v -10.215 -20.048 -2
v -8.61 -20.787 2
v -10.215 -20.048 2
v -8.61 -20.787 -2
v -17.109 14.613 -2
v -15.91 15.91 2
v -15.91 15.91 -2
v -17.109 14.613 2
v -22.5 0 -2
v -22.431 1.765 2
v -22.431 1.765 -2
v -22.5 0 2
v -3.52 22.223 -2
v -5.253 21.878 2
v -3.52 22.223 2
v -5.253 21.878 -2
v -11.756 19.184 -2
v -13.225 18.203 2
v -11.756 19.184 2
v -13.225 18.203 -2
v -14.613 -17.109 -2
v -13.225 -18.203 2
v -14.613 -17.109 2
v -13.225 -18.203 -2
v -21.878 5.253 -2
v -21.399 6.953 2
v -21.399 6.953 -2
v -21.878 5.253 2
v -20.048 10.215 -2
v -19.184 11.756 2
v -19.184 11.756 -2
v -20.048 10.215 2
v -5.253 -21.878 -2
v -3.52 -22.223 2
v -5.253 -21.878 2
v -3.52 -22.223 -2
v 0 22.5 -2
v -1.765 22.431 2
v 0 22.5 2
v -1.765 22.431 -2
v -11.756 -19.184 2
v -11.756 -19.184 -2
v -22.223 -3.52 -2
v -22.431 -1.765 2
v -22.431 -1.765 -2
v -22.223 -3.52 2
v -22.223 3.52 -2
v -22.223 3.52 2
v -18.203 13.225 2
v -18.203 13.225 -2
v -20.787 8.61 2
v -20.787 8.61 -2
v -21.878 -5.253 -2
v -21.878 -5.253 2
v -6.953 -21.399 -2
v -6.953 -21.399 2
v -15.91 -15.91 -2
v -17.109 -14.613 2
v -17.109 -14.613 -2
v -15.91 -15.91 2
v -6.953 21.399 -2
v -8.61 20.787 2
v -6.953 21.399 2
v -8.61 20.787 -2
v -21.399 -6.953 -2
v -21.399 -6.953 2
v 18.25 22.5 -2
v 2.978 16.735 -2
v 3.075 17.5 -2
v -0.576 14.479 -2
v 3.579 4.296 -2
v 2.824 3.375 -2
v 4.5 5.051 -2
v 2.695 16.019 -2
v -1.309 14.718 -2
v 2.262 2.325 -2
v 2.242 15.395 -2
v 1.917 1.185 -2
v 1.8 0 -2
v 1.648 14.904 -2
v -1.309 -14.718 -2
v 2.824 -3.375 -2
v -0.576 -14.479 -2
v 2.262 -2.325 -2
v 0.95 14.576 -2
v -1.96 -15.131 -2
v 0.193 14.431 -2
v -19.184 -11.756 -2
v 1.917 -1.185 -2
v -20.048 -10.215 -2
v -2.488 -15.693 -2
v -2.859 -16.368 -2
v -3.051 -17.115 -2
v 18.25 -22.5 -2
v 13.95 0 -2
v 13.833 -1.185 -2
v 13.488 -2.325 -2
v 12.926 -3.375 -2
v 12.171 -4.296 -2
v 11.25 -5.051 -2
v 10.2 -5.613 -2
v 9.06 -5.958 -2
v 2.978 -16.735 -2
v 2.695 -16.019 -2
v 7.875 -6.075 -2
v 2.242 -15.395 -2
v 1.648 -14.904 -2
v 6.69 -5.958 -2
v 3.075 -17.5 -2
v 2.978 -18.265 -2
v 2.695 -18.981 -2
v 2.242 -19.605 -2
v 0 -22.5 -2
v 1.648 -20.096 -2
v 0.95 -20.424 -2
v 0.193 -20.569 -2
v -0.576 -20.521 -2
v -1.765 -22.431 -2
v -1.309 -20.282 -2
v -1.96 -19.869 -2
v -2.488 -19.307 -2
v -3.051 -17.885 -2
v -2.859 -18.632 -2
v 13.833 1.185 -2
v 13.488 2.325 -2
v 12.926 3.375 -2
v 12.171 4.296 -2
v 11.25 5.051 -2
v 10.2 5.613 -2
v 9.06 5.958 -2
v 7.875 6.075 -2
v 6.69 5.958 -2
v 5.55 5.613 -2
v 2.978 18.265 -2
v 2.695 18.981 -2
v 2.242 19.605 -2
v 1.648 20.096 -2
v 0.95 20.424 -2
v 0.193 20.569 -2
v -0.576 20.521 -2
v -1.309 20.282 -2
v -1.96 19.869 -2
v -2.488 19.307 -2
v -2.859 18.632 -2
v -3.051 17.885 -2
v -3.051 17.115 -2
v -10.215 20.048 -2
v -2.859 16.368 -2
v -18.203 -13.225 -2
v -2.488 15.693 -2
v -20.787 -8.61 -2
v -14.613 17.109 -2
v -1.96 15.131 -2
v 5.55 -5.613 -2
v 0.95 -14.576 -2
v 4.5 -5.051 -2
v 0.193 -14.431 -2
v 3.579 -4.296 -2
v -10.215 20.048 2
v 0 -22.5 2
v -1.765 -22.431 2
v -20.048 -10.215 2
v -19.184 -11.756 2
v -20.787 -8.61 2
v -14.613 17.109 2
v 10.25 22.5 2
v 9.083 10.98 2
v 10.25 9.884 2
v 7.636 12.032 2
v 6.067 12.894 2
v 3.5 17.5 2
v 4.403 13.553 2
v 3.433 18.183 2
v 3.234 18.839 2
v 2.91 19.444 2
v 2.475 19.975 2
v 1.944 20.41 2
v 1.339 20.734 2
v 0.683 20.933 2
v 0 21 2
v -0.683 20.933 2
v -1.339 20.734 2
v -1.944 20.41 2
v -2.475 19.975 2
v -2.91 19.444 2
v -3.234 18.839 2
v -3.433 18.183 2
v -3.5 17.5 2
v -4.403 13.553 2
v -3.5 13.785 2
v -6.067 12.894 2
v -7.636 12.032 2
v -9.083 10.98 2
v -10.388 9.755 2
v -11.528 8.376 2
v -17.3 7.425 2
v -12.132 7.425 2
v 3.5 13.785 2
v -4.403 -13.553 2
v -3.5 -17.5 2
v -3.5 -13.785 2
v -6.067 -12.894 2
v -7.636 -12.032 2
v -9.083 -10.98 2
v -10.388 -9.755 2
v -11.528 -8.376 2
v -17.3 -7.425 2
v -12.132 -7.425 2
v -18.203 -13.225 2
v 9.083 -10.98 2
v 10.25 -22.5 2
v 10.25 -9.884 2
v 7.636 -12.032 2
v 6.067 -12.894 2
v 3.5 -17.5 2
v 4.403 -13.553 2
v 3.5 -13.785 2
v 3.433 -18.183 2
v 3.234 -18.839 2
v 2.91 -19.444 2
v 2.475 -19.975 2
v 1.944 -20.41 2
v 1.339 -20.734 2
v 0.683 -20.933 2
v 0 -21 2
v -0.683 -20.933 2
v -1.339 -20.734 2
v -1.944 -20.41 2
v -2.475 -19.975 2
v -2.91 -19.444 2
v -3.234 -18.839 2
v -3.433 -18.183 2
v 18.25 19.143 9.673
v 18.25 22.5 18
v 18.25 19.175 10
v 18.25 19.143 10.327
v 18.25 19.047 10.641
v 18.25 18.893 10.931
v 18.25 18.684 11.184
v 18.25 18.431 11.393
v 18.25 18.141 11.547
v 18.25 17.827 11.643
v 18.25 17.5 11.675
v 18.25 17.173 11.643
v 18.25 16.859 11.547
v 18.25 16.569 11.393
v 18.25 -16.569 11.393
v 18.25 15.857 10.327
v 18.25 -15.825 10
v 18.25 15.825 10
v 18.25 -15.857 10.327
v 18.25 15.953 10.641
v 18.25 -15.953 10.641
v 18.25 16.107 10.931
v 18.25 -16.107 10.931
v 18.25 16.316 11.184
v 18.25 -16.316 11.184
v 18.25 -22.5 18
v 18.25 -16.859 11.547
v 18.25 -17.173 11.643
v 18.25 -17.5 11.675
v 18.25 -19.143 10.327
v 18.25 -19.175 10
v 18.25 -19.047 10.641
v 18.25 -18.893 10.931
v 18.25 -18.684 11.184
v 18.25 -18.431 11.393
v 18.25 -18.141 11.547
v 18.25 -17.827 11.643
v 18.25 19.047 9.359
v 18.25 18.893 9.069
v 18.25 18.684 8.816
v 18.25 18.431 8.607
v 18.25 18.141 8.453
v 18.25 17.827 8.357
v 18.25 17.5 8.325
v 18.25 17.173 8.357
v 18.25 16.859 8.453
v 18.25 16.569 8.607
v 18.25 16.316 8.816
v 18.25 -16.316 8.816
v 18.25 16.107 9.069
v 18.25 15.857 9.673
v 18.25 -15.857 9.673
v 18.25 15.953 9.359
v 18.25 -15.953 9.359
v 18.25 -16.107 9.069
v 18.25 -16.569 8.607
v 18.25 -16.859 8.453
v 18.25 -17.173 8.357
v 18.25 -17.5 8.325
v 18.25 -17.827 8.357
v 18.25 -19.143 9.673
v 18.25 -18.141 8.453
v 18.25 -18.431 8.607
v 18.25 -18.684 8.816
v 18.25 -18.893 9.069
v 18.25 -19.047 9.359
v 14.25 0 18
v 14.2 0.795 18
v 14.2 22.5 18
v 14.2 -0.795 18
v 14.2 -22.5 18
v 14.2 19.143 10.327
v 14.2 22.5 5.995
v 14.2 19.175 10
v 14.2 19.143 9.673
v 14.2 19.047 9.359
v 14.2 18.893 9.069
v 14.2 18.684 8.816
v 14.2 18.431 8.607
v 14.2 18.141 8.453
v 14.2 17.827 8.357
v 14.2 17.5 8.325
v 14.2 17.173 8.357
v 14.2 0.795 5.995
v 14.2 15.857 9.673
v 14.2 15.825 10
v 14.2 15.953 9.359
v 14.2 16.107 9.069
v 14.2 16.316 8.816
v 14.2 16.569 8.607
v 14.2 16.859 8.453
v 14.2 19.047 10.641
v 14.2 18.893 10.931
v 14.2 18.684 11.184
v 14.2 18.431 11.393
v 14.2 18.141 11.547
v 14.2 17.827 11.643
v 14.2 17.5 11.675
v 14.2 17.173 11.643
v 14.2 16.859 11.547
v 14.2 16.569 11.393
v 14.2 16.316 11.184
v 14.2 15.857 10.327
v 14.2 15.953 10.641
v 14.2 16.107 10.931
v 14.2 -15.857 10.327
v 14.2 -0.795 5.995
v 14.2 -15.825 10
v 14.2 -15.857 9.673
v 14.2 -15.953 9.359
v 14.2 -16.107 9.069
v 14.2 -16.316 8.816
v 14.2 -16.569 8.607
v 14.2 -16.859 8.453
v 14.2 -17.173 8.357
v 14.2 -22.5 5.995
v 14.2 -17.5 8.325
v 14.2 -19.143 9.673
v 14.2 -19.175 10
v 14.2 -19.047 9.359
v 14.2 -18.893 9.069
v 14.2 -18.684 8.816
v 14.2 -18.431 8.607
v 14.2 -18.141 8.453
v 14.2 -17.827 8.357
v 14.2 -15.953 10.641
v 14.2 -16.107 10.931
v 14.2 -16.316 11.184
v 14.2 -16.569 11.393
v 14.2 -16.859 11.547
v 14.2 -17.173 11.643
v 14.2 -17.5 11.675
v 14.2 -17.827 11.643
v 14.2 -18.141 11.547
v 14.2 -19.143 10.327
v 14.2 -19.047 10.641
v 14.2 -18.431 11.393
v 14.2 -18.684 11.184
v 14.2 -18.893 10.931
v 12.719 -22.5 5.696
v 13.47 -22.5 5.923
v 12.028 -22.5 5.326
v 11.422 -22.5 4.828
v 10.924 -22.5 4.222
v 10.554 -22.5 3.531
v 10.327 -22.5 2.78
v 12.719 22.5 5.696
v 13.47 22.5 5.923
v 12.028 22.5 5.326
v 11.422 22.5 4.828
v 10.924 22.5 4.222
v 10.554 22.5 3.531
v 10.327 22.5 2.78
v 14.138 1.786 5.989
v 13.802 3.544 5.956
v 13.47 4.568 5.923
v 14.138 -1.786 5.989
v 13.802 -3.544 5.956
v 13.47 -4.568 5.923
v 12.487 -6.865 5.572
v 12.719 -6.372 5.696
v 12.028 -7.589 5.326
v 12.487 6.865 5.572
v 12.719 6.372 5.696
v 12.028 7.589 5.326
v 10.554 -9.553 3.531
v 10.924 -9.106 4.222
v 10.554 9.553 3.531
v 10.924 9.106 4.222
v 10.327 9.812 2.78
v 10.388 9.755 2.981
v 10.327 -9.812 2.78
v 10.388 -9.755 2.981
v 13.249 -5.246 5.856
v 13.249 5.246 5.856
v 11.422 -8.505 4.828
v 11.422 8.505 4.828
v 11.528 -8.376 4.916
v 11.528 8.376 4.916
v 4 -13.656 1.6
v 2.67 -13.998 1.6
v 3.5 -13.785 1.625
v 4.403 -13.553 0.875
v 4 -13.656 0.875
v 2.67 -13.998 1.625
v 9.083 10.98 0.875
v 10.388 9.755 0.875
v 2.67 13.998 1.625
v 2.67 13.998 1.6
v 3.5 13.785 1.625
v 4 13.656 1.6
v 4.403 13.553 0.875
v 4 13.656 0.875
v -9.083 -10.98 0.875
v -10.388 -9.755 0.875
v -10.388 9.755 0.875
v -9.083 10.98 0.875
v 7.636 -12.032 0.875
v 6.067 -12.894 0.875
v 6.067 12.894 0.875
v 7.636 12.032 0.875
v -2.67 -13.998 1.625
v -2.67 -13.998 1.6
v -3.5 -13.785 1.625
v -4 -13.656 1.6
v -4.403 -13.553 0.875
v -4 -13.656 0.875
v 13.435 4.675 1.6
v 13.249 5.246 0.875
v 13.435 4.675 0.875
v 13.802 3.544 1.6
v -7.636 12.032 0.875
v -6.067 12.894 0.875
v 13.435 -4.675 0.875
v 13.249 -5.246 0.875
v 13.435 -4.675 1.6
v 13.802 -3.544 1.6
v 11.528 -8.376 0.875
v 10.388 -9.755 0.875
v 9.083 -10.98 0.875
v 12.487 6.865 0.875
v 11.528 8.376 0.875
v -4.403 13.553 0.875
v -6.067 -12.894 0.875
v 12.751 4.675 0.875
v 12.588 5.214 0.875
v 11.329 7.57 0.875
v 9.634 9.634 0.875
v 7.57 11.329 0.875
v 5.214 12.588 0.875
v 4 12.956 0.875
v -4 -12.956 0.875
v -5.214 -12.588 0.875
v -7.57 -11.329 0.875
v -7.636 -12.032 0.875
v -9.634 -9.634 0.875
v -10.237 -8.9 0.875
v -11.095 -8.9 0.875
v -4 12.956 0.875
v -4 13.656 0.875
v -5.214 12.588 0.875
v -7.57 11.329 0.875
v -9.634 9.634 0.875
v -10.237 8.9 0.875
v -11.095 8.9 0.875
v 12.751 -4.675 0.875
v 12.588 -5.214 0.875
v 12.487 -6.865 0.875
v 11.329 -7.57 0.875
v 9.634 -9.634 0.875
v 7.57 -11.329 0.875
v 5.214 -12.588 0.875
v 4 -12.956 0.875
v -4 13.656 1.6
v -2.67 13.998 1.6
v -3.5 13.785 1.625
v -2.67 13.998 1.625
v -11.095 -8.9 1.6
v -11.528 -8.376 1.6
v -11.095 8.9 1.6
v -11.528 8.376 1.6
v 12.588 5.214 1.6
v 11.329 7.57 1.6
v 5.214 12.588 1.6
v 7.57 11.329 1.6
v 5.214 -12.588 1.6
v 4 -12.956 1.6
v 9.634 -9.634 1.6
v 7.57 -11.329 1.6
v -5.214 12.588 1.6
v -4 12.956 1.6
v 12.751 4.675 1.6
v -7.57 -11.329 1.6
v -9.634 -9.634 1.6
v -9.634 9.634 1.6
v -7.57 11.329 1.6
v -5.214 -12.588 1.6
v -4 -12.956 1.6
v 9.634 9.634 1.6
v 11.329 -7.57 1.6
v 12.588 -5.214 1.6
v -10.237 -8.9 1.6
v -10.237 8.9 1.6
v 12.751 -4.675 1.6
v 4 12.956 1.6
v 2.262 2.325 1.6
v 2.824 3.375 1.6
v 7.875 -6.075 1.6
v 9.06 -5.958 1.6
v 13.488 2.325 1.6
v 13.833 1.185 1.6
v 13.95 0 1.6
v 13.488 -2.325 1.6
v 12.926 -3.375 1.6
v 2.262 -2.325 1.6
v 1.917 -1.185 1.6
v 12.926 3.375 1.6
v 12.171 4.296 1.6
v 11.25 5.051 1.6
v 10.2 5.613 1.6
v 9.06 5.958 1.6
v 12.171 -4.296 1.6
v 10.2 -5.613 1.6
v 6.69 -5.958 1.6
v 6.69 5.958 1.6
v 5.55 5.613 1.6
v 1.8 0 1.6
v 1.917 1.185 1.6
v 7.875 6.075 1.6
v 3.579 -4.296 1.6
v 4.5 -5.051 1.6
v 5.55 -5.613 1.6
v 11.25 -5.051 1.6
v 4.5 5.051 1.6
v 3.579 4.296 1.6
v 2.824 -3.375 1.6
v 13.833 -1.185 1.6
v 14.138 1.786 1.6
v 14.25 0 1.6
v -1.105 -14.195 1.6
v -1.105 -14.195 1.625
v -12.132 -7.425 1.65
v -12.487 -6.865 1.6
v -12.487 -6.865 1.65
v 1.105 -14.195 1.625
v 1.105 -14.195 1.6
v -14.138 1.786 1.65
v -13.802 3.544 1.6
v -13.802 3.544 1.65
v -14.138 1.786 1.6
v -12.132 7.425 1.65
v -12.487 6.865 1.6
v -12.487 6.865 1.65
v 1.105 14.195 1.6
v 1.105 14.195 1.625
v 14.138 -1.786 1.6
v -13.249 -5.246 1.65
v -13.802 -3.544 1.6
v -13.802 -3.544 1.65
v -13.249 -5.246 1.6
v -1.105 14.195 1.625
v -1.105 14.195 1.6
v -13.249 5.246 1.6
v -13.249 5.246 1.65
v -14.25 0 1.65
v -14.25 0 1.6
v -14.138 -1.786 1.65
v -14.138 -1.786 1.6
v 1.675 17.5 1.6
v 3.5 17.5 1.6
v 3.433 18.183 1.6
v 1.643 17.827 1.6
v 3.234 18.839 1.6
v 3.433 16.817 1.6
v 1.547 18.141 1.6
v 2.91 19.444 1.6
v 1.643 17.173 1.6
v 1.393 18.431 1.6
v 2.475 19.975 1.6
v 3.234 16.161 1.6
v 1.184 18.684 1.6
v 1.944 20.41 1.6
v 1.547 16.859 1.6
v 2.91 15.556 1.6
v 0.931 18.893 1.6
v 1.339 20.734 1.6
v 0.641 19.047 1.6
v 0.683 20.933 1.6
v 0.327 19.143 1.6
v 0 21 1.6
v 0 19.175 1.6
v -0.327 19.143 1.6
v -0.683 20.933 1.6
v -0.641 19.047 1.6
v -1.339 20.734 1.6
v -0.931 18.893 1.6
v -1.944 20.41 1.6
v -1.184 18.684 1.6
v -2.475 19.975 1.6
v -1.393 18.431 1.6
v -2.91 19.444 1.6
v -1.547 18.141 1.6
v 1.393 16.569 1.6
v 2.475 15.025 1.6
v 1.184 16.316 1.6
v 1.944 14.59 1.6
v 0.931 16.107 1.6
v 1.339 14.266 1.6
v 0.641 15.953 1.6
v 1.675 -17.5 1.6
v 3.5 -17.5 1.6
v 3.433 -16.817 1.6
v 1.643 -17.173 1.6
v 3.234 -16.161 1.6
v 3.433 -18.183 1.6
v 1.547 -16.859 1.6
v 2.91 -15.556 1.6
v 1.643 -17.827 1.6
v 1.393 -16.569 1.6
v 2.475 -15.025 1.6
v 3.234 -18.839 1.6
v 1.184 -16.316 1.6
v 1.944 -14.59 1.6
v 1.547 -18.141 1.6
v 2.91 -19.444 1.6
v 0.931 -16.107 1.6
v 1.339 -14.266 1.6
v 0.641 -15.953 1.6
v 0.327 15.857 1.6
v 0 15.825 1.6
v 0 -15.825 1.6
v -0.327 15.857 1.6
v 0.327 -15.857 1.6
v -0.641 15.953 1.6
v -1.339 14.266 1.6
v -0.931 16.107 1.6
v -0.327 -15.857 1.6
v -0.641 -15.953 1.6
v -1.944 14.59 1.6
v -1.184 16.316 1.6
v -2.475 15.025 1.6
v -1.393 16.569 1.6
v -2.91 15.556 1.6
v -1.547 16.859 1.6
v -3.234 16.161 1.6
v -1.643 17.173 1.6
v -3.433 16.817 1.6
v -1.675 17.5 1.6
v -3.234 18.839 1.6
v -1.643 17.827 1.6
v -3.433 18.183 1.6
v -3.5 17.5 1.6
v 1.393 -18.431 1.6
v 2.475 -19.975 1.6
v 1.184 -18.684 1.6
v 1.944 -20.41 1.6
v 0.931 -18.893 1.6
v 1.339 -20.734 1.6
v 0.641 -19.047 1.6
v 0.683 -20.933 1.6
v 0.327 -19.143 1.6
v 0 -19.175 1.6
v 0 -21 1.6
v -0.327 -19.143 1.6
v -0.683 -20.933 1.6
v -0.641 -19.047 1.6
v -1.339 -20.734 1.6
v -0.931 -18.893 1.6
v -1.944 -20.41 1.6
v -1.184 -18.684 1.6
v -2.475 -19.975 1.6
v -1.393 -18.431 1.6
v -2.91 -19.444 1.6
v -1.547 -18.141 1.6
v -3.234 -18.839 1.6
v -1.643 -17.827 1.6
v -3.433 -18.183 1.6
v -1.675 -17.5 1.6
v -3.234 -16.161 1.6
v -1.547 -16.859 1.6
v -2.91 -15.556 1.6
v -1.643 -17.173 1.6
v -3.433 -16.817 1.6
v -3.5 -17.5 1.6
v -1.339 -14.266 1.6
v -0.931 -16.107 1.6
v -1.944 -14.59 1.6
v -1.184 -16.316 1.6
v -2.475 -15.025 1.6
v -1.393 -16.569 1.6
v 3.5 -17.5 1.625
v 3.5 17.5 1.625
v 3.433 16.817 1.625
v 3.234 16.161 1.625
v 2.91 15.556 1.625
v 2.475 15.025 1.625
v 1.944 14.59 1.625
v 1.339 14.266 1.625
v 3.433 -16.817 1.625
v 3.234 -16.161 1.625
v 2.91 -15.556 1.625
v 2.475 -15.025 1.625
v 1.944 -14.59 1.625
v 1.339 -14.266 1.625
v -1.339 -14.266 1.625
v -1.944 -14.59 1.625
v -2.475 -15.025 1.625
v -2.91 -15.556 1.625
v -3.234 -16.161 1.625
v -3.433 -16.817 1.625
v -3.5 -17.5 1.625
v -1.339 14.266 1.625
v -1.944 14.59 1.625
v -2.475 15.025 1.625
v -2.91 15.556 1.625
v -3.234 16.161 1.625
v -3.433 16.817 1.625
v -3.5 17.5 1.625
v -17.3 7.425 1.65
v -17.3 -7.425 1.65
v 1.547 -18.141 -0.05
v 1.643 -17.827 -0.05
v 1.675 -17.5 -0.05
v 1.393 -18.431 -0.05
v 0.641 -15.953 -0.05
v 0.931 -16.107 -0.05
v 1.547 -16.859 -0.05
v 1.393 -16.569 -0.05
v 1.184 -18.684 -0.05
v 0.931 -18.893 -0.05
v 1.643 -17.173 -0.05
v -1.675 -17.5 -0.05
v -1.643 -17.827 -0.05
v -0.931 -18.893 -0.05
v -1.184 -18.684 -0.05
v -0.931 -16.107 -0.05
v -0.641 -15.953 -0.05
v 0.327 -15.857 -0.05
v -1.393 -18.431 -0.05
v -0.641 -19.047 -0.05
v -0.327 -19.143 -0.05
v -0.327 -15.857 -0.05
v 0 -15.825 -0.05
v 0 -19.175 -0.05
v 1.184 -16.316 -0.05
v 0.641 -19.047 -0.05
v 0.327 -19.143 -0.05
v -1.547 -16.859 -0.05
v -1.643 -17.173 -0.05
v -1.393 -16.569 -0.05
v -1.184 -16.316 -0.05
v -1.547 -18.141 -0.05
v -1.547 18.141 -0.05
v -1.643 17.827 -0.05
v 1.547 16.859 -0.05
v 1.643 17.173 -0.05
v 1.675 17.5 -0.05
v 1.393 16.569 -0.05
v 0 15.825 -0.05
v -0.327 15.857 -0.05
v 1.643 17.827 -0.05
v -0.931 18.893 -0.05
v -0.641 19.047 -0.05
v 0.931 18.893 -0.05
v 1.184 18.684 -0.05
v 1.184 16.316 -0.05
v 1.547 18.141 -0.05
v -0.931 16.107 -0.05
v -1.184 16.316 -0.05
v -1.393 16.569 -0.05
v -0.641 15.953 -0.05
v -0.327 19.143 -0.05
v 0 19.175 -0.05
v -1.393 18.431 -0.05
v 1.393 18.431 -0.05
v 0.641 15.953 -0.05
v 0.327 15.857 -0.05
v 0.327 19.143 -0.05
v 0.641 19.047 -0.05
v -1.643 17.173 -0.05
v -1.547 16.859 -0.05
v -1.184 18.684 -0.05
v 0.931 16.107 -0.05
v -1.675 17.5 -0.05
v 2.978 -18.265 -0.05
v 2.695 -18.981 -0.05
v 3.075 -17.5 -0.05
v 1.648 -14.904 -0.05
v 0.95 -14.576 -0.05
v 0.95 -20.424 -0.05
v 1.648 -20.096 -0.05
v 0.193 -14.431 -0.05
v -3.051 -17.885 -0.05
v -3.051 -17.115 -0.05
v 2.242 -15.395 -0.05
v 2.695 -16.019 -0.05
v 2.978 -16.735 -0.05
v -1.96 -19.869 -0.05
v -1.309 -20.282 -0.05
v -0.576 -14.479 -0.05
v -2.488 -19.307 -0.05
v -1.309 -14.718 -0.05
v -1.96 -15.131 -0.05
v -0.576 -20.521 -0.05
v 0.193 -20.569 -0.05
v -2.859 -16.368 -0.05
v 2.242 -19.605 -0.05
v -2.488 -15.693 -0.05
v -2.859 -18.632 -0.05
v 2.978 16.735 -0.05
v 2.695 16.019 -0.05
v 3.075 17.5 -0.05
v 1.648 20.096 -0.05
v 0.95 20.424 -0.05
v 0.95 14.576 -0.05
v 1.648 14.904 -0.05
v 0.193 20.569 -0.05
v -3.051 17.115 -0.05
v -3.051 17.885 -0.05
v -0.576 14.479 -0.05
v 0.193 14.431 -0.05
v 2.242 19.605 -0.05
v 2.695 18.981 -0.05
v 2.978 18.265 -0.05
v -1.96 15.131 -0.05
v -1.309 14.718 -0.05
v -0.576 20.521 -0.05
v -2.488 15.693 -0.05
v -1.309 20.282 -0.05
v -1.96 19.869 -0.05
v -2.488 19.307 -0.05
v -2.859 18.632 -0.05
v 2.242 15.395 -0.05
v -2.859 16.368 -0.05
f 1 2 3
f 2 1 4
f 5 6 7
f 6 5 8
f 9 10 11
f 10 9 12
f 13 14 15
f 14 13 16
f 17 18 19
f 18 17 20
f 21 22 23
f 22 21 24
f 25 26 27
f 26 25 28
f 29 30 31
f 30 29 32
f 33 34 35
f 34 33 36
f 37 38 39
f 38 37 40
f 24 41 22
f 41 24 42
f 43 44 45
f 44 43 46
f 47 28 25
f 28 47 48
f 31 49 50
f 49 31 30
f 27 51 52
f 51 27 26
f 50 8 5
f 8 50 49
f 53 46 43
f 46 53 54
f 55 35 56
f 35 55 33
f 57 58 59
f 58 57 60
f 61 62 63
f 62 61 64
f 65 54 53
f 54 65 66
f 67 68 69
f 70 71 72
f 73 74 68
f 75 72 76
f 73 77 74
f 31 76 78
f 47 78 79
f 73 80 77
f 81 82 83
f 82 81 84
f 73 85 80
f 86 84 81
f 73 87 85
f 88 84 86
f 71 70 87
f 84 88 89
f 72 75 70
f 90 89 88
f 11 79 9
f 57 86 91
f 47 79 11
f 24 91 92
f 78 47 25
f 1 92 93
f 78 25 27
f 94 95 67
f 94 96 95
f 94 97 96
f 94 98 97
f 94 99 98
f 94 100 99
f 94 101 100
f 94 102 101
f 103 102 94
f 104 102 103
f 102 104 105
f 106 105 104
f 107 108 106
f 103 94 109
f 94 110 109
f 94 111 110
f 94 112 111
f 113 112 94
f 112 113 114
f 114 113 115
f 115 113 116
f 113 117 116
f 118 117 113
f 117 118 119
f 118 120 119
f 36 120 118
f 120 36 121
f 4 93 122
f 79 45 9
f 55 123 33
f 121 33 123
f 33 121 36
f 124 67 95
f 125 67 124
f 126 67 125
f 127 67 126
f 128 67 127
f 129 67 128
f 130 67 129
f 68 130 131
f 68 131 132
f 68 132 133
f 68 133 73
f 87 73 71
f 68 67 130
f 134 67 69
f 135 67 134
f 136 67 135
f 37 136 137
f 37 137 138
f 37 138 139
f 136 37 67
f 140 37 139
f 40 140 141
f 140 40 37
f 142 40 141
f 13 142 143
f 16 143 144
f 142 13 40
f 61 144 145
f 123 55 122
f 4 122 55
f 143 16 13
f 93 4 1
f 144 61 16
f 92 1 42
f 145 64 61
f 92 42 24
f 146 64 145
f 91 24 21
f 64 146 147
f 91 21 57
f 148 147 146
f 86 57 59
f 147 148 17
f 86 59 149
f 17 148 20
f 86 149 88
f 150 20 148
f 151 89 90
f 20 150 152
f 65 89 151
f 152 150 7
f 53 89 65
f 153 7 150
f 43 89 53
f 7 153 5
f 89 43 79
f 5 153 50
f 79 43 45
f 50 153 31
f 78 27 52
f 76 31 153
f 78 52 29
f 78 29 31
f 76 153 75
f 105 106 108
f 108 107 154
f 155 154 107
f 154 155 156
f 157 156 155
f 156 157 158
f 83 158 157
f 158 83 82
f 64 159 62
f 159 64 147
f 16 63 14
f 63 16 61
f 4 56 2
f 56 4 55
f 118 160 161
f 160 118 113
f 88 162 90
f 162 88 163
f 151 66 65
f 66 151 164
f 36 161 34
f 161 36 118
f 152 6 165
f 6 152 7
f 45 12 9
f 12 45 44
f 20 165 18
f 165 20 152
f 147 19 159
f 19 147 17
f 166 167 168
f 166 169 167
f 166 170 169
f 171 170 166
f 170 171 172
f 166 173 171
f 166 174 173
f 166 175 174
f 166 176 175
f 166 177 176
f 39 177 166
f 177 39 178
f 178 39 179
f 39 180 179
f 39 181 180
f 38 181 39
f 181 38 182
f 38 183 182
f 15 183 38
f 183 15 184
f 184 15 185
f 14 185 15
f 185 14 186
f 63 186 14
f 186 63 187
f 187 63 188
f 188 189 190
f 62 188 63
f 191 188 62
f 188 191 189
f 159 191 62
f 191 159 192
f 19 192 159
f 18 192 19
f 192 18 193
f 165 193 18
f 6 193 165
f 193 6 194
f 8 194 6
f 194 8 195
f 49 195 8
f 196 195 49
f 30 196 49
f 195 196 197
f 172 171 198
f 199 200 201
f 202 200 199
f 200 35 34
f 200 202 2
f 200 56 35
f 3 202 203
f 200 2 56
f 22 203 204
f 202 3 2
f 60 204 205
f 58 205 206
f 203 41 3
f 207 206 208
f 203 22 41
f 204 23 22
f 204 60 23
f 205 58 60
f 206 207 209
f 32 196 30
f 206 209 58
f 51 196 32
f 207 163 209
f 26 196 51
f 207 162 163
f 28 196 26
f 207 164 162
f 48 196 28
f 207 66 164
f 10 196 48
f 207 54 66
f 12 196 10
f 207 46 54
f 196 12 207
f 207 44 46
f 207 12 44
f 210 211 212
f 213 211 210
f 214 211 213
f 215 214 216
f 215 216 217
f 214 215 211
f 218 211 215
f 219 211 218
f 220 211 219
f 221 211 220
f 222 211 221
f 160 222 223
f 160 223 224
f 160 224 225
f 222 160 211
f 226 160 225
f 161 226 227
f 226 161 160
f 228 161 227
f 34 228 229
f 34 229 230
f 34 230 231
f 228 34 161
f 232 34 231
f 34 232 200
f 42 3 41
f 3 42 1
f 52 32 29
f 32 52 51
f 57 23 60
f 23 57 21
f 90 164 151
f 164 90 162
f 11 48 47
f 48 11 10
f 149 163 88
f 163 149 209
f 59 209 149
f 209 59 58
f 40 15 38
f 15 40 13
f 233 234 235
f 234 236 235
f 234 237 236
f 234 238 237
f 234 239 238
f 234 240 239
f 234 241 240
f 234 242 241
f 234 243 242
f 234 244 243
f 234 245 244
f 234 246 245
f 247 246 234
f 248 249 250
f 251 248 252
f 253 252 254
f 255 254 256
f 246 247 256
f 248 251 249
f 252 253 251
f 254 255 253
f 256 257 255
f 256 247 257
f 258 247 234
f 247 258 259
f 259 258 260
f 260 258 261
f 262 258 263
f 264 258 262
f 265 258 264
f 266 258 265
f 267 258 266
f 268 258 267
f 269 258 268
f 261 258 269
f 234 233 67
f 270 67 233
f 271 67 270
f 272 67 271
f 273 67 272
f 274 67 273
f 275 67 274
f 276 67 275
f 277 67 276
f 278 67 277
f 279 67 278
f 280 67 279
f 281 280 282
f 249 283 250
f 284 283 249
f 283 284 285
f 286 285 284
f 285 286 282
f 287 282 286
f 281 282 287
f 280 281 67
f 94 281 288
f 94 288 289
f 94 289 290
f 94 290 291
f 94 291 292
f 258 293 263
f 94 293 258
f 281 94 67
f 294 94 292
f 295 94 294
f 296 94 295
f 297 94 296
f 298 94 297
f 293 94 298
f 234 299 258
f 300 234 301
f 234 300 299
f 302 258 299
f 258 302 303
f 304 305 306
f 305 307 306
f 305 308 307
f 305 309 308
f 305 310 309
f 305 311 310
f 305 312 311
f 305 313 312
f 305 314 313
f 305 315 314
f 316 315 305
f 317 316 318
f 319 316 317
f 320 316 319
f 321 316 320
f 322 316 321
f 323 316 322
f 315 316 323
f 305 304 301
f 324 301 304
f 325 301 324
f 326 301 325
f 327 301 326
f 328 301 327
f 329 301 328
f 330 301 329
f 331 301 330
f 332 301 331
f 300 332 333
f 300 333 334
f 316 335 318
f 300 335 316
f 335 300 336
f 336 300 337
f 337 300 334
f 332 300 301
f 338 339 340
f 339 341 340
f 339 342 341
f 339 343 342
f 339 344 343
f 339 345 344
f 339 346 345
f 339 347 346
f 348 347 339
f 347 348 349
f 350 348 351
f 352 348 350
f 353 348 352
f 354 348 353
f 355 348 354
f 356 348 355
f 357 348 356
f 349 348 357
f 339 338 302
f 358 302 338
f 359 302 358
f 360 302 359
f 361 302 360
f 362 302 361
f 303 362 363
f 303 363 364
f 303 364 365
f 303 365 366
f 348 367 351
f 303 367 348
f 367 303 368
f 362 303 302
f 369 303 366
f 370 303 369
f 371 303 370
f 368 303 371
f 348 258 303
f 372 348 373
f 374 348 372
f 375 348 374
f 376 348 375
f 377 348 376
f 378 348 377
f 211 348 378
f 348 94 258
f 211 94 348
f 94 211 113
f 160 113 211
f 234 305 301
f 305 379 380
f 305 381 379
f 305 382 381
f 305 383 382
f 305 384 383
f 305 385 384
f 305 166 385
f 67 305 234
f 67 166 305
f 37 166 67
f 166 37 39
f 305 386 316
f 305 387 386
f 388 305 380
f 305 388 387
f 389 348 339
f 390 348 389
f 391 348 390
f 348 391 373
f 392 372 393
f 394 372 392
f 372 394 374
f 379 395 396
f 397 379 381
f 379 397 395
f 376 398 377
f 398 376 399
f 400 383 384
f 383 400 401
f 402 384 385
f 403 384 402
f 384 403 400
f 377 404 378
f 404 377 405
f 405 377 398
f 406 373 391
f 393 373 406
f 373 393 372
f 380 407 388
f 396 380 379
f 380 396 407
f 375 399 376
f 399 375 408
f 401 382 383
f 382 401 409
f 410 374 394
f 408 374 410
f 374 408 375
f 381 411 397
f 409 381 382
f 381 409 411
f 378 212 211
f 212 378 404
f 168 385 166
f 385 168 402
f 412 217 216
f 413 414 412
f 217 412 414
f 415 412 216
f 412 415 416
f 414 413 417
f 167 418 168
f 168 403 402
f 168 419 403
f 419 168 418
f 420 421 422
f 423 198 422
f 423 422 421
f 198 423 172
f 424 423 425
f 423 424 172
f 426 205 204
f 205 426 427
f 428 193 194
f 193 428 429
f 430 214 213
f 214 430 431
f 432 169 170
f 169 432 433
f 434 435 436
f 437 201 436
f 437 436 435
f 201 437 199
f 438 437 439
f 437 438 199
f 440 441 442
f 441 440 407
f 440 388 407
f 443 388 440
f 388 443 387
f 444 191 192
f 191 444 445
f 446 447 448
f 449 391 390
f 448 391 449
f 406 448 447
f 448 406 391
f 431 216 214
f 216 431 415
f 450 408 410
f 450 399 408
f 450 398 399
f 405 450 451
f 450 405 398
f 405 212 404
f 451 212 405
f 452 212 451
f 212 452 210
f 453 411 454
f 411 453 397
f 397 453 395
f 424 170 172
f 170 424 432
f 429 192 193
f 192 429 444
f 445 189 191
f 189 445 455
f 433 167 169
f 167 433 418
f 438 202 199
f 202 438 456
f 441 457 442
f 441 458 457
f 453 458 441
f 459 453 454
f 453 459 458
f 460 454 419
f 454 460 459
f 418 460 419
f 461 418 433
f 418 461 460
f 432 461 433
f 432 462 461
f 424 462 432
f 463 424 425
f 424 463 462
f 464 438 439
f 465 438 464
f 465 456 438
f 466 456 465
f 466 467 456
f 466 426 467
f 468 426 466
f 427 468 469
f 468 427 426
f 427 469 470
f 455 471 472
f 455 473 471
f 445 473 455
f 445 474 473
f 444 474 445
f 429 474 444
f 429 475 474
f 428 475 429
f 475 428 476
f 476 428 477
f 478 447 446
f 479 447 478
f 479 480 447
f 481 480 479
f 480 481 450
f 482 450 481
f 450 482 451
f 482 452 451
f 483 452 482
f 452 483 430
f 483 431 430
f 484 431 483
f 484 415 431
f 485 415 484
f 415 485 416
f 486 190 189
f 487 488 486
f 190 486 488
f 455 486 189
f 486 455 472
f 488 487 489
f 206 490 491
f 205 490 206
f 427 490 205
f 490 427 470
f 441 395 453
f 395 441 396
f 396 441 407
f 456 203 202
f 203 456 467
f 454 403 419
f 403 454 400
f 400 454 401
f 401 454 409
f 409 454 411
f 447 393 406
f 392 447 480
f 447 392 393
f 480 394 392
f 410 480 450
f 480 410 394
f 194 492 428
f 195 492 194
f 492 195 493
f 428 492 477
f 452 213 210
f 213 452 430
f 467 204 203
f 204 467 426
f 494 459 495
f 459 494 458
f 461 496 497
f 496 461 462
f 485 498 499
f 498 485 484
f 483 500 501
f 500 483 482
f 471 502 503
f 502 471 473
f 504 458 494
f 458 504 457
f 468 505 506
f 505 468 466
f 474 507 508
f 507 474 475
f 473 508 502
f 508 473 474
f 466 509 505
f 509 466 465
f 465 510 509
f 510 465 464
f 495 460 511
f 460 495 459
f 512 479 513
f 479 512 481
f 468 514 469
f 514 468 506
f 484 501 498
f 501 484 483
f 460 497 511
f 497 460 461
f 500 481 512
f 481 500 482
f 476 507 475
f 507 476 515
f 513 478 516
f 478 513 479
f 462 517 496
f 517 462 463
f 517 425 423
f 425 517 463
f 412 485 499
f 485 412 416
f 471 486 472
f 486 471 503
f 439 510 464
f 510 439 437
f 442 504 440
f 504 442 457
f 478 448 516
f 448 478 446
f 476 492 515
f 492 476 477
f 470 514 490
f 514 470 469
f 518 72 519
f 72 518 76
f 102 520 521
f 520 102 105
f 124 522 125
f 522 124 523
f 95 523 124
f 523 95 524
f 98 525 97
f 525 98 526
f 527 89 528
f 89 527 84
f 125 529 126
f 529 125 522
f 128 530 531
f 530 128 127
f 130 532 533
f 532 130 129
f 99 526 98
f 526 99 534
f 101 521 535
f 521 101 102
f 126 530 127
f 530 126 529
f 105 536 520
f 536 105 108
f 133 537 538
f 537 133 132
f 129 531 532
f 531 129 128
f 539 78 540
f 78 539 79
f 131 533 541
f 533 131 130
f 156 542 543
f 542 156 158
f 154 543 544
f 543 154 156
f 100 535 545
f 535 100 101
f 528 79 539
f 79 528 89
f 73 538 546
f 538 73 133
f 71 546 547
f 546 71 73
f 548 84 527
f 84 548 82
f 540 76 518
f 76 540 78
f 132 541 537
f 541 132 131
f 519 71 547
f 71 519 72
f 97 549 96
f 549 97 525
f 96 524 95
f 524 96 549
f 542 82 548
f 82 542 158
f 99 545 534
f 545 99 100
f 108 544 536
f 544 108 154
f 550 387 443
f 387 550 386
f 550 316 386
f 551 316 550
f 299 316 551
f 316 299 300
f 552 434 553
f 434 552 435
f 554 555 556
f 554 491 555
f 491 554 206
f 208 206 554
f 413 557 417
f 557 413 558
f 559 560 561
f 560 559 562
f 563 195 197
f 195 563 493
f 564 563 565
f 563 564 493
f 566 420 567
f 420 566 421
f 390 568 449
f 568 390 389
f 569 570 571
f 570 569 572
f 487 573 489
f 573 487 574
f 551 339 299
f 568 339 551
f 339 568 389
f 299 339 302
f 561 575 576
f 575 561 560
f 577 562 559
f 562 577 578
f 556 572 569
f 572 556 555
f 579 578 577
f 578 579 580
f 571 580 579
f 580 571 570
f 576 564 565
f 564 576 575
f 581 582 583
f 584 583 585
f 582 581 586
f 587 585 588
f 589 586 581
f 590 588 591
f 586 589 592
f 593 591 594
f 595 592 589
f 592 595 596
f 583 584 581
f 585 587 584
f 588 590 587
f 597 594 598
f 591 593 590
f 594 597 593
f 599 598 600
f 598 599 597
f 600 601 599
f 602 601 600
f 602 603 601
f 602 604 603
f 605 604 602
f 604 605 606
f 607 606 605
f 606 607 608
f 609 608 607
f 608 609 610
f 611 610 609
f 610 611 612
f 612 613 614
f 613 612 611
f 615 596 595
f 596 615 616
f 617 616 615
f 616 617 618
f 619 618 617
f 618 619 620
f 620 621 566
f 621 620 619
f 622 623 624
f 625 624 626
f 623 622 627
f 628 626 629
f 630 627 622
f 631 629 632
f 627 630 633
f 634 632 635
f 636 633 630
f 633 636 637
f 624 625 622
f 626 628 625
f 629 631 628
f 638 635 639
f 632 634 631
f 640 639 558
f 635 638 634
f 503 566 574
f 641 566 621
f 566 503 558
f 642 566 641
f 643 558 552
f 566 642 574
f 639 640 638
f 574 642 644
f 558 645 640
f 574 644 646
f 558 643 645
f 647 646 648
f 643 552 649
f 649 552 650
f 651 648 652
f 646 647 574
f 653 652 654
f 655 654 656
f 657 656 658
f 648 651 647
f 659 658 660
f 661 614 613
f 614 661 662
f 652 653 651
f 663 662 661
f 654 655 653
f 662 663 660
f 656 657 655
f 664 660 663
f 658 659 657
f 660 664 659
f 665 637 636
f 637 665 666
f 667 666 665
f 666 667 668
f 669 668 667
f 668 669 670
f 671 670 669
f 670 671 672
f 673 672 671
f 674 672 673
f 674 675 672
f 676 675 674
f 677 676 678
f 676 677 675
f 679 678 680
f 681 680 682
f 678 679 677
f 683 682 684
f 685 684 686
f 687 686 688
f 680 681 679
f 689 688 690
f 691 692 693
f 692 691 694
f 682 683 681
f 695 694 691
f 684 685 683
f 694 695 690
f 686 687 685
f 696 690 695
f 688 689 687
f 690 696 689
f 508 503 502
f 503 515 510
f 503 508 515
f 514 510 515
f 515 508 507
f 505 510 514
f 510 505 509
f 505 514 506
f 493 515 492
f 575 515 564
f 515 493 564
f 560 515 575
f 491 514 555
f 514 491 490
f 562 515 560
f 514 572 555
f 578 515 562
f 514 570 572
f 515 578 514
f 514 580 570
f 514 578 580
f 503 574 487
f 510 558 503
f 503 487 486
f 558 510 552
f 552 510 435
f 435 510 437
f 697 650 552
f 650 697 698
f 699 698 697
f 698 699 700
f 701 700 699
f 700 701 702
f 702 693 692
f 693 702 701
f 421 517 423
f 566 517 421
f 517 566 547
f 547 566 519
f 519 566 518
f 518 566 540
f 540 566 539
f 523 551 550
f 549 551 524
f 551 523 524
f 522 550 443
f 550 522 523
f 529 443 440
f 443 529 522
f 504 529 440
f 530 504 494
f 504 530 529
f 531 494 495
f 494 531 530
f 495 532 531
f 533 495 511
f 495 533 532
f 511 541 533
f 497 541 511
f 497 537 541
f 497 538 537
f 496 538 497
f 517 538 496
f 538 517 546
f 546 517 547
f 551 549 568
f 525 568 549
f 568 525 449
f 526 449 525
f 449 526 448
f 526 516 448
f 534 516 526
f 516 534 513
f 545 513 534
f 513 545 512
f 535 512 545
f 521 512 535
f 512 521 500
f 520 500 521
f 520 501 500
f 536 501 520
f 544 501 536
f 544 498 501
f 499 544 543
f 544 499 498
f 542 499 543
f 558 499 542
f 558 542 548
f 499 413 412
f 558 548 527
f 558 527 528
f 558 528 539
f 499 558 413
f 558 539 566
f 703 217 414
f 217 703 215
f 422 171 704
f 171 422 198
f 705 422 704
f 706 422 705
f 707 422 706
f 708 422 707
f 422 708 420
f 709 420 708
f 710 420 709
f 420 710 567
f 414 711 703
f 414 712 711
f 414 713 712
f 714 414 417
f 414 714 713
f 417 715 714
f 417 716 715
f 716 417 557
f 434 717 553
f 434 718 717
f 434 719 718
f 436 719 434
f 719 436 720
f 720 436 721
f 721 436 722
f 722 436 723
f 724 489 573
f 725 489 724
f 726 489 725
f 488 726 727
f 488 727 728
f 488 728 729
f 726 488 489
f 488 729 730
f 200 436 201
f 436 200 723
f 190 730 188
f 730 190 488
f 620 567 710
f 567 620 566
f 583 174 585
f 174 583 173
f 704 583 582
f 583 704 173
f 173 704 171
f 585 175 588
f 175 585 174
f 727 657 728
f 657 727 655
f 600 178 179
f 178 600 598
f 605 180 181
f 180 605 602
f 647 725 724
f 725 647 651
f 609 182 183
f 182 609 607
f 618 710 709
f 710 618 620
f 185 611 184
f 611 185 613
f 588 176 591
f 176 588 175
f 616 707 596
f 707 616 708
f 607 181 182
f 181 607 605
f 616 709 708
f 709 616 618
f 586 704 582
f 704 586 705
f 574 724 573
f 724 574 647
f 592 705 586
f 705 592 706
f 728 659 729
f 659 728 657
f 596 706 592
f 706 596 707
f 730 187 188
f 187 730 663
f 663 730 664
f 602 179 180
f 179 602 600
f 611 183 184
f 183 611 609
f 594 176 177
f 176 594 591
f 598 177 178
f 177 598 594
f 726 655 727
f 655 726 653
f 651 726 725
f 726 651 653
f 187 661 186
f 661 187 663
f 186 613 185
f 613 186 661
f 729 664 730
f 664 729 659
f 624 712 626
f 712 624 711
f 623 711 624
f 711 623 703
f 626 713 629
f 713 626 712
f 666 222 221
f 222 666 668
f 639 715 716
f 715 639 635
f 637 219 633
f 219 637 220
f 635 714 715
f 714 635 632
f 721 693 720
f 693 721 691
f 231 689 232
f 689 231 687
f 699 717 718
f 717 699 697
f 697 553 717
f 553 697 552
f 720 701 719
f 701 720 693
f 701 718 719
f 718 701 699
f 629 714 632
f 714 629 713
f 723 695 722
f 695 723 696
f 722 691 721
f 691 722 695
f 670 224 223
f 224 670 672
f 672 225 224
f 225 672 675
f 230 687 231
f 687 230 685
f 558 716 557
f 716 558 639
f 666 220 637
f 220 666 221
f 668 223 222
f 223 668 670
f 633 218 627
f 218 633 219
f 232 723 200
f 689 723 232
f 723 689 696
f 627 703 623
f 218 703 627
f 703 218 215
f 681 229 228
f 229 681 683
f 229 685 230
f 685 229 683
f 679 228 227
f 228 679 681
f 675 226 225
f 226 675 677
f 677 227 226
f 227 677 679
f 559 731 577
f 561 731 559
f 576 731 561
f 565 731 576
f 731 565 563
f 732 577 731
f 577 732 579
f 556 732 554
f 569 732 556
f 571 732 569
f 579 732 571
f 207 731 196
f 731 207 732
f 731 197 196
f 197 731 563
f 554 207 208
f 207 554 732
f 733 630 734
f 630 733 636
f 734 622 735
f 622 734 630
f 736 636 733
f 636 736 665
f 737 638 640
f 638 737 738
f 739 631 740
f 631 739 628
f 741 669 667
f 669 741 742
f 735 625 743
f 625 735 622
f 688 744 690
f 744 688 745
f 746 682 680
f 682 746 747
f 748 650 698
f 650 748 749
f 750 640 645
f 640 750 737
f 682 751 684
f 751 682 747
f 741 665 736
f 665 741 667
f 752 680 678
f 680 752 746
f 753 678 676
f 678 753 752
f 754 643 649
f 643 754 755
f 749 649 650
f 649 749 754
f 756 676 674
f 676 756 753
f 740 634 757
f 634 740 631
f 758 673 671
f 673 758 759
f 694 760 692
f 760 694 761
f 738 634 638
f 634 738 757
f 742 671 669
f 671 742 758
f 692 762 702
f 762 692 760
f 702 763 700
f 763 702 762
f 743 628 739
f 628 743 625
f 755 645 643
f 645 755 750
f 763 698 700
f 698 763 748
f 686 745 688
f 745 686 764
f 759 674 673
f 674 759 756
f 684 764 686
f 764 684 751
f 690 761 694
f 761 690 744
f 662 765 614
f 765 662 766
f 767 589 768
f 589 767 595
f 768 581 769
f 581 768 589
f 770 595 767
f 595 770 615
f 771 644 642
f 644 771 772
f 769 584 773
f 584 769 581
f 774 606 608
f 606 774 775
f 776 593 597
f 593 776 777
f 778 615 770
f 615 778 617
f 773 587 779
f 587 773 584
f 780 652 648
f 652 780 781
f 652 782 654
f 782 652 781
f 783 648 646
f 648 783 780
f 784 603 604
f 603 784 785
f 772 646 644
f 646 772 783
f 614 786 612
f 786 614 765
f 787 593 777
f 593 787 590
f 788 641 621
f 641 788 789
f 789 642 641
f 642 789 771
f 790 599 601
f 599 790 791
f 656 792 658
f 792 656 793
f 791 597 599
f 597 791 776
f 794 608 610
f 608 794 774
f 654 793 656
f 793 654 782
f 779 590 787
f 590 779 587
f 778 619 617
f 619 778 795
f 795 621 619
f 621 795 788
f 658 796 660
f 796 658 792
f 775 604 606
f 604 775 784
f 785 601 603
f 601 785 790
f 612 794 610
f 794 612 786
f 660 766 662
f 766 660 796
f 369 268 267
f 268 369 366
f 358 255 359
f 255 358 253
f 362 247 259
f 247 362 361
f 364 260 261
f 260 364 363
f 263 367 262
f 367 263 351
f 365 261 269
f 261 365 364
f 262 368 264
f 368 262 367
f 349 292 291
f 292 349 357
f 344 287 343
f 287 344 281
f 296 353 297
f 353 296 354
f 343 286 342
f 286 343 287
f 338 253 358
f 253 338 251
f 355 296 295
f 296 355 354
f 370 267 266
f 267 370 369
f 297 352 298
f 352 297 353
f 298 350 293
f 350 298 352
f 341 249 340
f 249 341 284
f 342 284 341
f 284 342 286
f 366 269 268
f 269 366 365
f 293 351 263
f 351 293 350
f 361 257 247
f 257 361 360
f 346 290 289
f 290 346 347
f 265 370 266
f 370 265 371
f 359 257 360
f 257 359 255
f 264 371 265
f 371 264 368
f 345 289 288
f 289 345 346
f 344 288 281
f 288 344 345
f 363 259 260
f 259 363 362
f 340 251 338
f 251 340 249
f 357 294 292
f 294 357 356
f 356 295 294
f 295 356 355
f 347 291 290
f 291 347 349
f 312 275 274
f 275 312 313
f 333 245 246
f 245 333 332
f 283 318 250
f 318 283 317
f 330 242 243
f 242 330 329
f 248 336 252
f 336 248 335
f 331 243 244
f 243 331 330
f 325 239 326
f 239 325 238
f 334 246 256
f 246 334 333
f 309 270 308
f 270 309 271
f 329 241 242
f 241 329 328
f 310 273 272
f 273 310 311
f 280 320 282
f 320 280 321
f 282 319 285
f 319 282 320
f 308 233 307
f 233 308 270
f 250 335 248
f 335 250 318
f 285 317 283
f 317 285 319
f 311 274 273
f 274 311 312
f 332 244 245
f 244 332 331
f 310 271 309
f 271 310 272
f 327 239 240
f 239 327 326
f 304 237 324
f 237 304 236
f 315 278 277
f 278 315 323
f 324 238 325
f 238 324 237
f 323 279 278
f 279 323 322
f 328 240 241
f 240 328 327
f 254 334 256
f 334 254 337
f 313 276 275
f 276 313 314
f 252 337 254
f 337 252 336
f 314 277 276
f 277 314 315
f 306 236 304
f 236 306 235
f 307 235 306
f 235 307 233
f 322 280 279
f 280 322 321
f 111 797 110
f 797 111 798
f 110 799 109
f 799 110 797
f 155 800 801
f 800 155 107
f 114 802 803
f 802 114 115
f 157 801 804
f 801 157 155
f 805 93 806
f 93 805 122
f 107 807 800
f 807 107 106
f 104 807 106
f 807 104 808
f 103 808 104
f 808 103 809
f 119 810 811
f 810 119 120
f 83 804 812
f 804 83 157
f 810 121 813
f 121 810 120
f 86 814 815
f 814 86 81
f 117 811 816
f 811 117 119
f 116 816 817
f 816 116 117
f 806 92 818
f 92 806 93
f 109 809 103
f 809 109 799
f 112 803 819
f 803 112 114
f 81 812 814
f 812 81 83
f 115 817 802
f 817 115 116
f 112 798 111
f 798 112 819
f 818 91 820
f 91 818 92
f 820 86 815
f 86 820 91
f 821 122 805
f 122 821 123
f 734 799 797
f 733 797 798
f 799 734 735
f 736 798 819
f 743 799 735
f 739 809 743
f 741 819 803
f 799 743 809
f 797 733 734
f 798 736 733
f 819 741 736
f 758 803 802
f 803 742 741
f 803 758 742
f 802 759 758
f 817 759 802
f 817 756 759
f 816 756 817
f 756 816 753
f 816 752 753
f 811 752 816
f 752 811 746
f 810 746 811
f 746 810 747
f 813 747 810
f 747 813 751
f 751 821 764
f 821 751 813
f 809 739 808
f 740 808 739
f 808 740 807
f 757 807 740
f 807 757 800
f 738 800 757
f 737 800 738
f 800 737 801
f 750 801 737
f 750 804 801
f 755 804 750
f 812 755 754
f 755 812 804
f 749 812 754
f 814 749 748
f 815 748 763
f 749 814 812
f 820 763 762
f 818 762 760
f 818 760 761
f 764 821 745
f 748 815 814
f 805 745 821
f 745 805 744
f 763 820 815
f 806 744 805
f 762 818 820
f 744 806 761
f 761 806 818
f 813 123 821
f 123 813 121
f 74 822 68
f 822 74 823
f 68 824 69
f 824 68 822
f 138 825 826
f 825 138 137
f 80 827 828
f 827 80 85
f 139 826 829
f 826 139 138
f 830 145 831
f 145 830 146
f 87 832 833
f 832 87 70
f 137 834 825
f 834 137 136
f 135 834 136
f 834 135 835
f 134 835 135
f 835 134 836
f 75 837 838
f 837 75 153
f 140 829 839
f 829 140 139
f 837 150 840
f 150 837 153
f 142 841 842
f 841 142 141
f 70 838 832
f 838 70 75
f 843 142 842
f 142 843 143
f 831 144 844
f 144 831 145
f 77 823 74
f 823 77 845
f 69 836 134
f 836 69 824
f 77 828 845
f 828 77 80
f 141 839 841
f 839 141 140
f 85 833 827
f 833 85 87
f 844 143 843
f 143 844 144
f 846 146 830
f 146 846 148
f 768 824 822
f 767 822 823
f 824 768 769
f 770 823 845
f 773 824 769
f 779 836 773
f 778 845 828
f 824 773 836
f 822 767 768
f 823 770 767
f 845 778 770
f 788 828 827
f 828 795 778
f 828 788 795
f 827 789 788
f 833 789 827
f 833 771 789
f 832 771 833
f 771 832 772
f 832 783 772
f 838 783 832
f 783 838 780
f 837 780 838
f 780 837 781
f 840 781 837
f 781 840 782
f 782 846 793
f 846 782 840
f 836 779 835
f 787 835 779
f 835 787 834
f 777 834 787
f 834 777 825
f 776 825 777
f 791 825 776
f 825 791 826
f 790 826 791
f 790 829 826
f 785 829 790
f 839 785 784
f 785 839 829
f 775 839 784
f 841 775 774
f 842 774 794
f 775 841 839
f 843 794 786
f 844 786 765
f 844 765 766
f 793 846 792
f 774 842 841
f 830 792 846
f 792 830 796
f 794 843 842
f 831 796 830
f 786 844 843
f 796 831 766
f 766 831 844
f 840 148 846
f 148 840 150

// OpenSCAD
// Bracket for  28BYJ-48 stepper motor
// 28BYJ-48 model from RGriffoGoes www.thingiverse.com/thing:204734
// added details by J.Beale 21 July 2014
// Bracket by J.Beale 9 Aug 2014

slop = 0.25;  // printer tolerance

// =========================================================
// stepper motor body model

MBH = 18.8;   // motor body height
MBD = 28.25+slop;  // motor body OD
SBD = 9.1+slop;    // shaft boss OD
SBH = 1.45;   // shaft boss height above motor body
SBO = 7.875;  // offset of shaft/boss center from motor center
//SHD = 4.93+slop*2;   // motor shaft OD+ countersink for boss
SHD = 11.9+slop;   // motor shaft OD (larger clearance hole)
SHDF = 3.0;   // motor shaft diameter, across flats
SHHF = 6.0;   // motor shaft flats height, or depth in from end
SHHF = 0.0;   // assume round shaft for purposes of bracket
SHH = 9.75;   // height of shaft above motor body 

MBFH = 0.7;   // height of body edge flange protruding above surface
MBFW = 1.0+slop;   // width of edge flange
MBFNW = 8;    // width of notch in edge flange
MBFNW2 = 17.8;  // width of edge flange notch above wiring box

MHCC = 35.0;  // mounting hole center-to-center
MTH  = 0.8;   // mounting tab thickness
MTW  = 7.0;   // mounting tab width
// MTHID = 4.0;  // mounting tab hole inner diameter
MTHID = 3.0;  // mounting tab hole inner diameter
WBH  = 16.7;  // plastic wiring box height
WBW  = 14.6+slop;  // plastic wiring box width
WBD  = 31.3+slop;  // body diameter to outer surface of wiring box

WRD = 1.0;     // diameter of electrical wires
WRL = 30;      // length of electrical wires
WRO = 2.2;		// offset of wires below top motor surface
// =========================================================
// right-angle bracket for motor

MSOD = 5.9 + slop;  // M3 mounting screw head diameter
MSTH = 2.0;  // M3 screw head thickness (for countersink)
//MSTH = 0; // set to zero for no screwhead countersink
MSSD = 3.1 + slop;  // M3 screw diameter clearance hole
Bthick = 4;  // thickness of bracket
Bdia = (MHCC+10);  // diameter of bracket face

// =========================================================
fn = 80;
eps = 0.05;   // small number to avoid coincident faces


module StepMotor28BYJ()
{
  difference(){
    union(){
	   color("gray") translate([0,0,-(MBH+MBFH)/2])
		  difference() {  // flange at top rim
         cylinder(h = MBFH+eps, r = MBD/2, center = true, $fn = 50);
         cylinder(h = MBFH+2*eps, r = (MBD-MBFW)/2, center = true, $fn = 32);
			cube([MBFNW,MHCC,MBFH*2],center=true); // notches in rim
			cube([MBD+2*MBFW,SBD,MBFH*2],center=true);
		   translate([-MBD/2,0,0]) cube([MBD,MBFNW2,MBFH*2],center=true);
        }
		color("gray") // motor body
			cylinder(h = MBH, r = MBD/2, center = true, $fn = 50);
		color("gray") translate([SBO,0,-SBH])	// shaft boss
			cylinder(h = MBH, r = SBD/2, center = true, $fn = 32);

		translate([SBO,0,-SHH])	// motor shaft
        difference() {
			color("gold") cylinder(h = MBH, r = SHD/2, center = true, $fn = 32);
				// shaft flats
		   color("red") translate([(SHD+SHDF)/2,0,-(eps+MBH-SHHF)/2]) 
				cube([SHD,SHD,SHHF], center = true);
		   color("red") translate([-(SHD+SHDF)/2,0,-(eps+MBH-SHHF)/2]) 
				cube([SHD,SHD,SHHF], center = true);
        }


		color("Silver") translate([0,0,-(MBH-MTH-eps)/2]) // mounting tab 
			cube([MTW,MHCC,MTH], center = true);				
		color("Silver") translate([0,MHCC/2,-(MBH-MTH)/2]) // mt.tab rounded end
			cylinder(h = MTH, r = MTW/2, center = true, $fn = 32);
		color("Silver") translate([0,-MHCC/2,-(MBH-MTH)/2]) // mt.tab rounded end
			cylinder(h = MTH, r = MTW/2, center = true, $fn = 32);


		color("blue") translate([-(WBD-MBD),0,eps-(MBH-WBH)/2]) // plastic wire box
			cube([MBD,WBW,WBH], center = true);
	   color("blue") translate([-2,0,0])	
			cube([24.5,16,15], center = true);
		}

				// mounting holes in tabs on side
		color("red") translate([0,MHCC/2,-MBH/2])	
				cylinder(h = 2, r = MTHID/2, center = true, $fn = 32);
		color("red") translate([0,-MHCC/2,-MBH/2])	
				cylinder(h = 2, r = MTHID/2, center = true, $fn = 32);
		}
}

module MOT() {
 translate([0,0,-MBH/2]) 
 rotate([180,0,0]) StepMotor28BYJ();  // motor body (without wires)
}


module bracket() {
difference() {
 union() {
  translate([0,0,-2]) cylinder(h=Bthick, r=Bdia/2, $fn=fn);  // round face
  translate([-eps + MBD/2,-Bdia/2,-20+Bthick/2]) 
		cube([4+eps,Bdia,20]); // flange
  translate([-0,-Bdia/2,-Bthick/2]) 
	cube([Bdia,Bdia,Bthick]); // square edge joining round face to flange
  translate([MBD/2,Bdia/2,-Bthick/2]) rotate([90,0,0]) 
	cylinder(r=Bthick,h=Bdia,$fn=32); // round fillet at flange
 }
 union() {
   translate([4+MBD/2,-MBD,-MBD]) cube([MBD*2,MBD*2,MBD*2]);
   translate([0,MHCC/2,-10])	// motor mounting bolt
				cylinder(h = 30, r = MSSD/2, center = true, $fn = 32);
   translate([0,-MHCC/2,-10])	// motor mounting bole
				cylinder(h = 30, r = MSSD/2, center = true, $fn = 32);
   translate([10,MHCC/2,-10]) rotate([0,90,0]) 	// flange mounting bolt
				cylinder(h = 30, r = MSSD/2, center = true, $fn = 32);
   translate([10,-MHCC/2,-10]) rotate([0,90,0]) 	// flange mounting bolt
				cylinder(h = 30, r = MSSD/2, center = true, $fn = 32);

   color("white") translate([0,MHCC/2,((Bthick/2) - MSTH + eps)]) 
	 cylinder(r=MSOD/2, h=MSTH, $fn=25); // motor screw countersink
   color("white") translate([0,-MHCC/2,((Bthick/2) - MSTH + eps)])  
	 cylinder(r=MSOD/2, h=MSTH, $fn=25); // motor screw countersink

   translate([0,0,-1.6]) MOT(); // body of motor
   //translate([0,0,-10]) cube([50,50,50]); // DEBUG cutaway view
 }
}
} // end module()

rotate([180,0,0]) bracket();  // show the motor bracket
